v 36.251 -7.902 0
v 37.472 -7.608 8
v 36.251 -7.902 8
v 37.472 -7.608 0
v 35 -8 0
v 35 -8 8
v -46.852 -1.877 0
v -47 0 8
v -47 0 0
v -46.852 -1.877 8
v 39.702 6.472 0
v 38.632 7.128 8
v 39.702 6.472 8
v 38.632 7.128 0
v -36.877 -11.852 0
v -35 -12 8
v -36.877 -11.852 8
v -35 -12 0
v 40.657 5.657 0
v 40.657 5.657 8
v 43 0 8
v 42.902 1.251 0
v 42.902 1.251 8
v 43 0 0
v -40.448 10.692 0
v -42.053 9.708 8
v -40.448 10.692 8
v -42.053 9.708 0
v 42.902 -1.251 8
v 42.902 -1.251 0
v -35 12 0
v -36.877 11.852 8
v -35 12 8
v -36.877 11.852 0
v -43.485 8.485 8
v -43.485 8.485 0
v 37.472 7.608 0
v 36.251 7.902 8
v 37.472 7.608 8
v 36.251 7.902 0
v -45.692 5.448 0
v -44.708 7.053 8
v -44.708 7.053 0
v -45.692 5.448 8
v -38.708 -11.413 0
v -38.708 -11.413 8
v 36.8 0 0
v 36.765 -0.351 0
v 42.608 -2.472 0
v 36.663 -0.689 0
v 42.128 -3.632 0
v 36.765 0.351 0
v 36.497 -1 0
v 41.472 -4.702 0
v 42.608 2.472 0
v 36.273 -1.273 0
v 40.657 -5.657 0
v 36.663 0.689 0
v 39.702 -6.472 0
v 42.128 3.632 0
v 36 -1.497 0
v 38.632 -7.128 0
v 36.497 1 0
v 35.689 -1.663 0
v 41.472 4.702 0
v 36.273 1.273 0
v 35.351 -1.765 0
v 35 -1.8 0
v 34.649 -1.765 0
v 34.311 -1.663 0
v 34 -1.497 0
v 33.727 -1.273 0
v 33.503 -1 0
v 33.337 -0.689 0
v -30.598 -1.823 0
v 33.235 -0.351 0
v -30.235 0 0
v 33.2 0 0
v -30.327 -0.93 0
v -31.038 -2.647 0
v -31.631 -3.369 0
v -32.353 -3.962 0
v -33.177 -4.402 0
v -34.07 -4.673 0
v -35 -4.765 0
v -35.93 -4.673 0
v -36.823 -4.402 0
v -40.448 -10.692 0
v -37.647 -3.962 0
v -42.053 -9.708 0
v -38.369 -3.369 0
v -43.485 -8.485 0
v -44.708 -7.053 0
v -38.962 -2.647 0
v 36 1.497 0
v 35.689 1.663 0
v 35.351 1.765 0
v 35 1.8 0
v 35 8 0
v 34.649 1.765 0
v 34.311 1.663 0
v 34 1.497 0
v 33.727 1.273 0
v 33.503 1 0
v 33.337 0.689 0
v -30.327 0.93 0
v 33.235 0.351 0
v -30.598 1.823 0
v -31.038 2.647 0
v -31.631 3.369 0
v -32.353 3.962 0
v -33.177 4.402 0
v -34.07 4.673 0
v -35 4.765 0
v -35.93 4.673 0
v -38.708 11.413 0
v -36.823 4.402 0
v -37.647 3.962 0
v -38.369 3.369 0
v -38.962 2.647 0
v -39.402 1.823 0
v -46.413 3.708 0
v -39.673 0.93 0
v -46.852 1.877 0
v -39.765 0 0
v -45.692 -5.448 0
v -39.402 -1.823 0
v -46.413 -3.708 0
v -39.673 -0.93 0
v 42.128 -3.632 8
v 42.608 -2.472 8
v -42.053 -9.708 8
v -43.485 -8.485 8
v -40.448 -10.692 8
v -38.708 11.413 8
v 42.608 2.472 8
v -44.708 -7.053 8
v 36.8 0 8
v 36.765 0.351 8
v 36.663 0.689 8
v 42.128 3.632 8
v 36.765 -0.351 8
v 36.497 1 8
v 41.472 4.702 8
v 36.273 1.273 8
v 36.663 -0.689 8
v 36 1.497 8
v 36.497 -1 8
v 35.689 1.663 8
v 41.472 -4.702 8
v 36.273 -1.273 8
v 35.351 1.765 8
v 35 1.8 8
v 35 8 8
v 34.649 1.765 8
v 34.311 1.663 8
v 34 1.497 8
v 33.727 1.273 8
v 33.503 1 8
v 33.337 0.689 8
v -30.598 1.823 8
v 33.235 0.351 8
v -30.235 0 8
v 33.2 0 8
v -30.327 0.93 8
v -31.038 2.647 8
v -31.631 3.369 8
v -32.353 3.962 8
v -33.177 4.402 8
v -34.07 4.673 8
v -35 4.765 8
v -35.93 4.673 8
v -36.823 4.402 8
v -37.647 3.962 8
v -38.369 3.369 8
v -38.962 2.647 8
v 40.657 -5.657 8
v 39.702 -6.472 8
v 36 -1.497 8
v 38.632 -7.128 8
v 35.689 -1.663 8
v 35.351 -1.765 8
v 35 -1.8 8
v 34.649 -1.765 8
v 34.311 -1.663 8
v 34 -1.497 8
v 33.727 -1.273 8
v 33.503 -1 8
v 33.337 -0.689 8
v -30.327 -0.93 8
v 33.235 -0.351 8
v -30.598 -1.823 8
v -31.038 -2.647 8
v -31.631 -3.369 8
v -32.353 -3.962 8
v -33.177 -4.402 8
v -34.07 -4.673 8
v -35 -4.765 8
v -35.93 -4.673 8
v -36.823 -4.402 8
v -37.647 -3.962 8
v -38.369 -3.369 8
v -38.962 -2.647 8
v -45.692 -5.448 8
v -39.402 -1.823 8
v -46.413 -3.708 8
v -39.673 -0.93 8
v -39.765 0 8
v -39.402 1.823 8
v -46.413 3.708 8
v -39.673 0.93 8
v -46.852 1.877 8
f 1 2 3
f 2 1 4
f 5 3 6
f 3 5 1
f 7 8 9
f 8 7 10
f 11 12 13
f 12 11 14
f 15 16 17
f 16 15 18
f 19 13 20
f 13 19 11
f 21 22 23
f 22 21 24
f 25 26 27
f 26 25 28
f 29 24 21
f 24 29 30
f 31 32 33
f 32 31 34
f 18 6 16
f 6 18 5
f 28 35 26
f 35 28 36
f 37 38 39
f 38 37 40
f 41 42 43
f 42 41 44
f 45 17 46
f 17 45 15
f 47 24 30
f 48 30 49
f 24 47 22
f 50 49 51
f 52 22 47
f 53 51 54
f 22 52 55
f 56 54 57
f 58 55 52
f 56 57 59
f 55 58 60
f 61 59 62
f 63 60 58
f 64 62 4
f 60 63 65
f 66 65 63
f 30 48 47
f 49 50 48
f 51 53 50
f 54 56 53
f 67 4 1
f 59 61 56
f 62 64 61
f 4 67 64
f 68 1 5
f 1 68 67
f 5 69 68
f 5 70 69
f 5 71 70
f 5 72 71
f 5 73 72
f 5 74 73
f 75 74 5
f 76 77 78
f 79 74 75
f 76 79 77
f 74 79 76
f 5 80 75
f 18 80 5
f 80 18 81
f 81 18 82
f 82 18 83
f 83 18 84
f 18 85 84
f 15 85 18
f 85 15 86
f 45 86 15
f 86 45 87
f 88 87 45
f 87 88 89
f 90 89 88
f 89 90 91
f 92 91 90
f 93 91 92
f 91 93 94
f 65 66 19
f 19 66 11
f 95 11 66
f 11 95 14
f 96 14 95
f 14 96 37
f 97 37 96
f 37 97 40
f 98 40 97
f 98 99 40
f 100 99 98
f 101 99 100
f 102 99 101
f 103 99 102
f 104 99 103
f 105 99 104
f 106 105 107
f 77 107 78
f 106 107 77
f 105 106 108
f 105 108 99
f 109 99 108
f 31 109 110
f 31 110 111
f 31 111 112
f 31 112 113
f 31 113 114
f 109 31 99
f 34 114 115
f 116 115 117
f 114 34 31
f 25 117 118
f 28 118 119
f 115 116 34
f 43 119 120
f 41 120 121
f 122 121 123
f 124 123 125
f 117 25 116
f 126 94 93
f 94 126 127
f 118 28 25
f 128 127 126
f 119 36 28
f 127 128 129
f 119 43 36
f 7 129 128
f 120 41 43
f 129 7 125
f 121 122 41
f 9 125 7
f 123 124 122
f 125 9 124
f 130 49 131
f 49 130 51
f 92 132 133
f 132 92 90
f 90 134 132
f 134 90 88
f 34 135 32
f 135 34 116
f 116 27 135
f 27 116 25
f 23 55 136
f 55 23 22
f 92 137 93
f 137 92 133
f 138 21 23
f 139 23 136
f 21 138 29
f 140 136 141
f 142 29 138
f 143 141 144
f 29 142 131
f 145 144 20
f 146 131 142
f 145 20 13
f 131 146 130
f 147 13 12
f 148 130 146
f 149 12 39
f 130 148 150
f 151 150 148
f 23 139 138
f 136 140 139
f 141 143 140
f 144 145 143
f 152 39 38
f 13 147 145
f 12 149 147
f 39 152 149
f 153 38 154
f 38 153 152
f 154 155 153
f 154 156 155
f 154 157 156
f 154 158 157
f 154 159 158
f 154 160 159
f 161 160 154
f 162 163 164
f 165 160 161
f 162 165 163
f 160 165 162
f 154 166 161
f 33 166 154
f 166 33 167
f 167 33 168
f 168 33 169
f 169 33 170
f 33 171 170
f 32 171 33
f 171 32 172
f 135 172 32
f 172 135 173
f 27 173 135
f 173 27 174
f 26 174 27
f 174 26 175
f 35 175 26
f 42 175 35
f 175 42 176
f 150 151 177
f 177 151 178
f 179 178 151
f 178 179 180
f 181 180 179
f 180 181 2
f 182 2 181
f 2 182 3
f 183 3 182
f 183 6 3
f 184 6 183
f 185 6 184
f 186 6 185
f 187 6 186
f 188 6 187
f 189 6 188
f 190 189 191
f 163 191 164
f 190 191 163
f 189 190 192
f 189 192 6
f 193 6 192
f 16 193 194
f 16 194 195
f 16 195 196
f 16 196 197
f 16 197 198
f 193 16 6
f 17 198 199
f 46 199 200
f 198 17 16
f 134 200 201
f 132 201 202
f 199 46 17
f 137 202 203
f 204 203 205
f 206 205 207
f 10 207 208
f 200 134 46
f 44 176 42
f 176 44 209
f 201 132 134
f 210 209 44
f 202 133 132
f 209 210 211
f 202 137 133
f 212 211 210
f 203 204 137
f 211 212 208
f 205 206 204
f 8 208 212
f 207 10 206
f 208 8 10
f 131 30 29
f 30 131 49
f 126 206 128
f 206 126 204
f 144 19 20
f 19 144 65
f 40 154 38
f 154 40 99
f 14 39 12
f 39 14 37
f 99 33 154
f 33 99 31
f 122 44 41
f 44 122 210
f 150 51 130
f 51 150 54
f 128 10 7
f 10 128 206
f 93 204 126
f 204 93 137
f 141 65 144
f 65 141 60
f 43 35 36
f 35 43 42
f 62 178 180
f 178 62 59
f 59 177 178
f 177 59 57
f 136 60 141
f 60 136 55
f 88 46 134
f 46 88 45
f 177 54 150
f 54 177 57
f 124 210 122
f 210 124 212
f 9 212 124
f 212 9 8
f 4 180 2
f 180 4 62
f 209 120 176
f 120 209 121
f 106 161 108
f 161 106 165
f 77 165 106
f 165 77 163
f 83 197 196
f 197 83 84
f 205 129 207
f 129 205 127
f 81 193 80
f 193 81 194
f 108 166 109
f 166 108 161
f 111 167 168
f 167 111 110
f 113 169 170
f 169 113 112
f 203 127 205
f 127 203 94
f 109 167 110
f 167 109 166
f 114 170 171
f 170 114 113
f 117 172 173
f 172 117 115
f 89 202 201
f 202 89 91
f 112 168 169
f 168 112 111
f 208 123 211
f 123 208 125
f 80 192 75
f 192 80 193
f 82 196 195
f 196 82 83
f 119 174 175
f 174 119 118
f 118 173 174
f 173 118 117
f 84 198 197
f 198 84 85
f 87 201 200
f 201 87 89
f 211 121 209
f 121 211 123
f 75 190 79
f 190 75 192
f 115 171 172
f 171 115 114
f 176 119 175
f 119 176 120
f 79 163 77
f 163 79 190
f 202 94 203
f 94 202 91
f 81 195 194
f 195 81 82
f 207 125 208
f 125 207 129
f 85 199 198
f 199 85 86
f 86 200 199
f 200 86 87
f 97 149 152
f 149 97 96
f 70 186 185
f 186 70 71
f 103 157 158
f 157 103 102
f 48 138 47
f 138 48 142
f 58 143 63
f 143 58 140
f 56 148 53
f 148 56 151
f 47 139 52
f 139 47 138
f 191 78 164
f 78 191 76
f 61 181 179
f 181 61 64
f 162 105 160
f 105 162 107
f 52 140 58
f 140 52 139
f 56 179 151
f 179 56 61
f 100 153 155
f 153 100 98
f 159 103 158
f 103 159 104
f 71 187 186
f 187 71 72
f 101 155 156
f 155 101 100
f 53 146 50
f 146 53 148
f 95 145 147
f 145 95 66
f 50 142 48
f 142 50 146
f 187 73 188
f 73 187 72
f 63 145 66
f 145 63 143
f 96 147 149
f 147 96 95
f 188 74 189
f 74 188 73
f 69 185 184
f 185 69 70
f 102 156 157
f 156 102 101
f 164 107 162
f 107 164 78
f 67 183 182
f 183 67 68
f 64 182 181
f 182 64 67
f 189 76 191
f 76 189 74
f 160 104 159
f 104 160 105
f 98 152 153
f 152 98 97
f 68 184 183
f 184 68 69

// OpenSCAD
$fn = 32;

// ----------------------------------------------------------------------
// Lever: 70 mm between the bosses, 8 mm thick, smooth outline
// ----------------------------------------------------------------------

// --- parameters (mm) ---
lever_l = 70;             // distance between the boss centres
boss_a = 24;              // first boss diameter
boss_b = 16;              // second boss diameter
bore_a = 9.53;            // first bore
bore_b = 3.6;             // second bore
lever_t = 8;              // lever thickness

lever_profile = [[-47, 0], [-46.852, -1.877], [-46.413, -3.708], [-45.692, -5.448], [-44.708, -7.053], [-43.485, -8.485], [-42.053, -9.708], [-40.448, -10.692], [-38.708, -11.413], [-36.877, -11.852], [-35, -12], [35, -8], [36.251, -7.902], [37.472, -7.608], [38.632, -7.128], [39.702, -6.472], [40.657, -5.657], [41.472, -4.702], [42.128, -3.632], [42.608, -2.472], [42.902, -1.251], [43, 0], [42.902, 1.251], [42.608, 2.472], [42.128, 3.632], [41.472, 4.702], [40.657, 5.657], [39.702, 6.472], [38.632, 7.128], [37.472, 7.608], [36.251, 7.902], [35, 8], [-35, 12], [-36.877, 11.852], [-38.708, 11.413], [-40.448, 10.692], [-42.053, 9.708], [-43.485, 8.485], [-44.708, 7.053], [-45.692, 5.448], [-46.413, 3.708], [-46.852, 1.877]];

difference() {
  linear_extrude(height = lever_t) polygon(lever_profile);
  translate([-35, 0, -2.5]) cylinder(h = lever_t + 5, d = bore_a);
  translate([35, 0, -2.5]) cylinder(h = lever_t + 5, d = bore_b);
}
